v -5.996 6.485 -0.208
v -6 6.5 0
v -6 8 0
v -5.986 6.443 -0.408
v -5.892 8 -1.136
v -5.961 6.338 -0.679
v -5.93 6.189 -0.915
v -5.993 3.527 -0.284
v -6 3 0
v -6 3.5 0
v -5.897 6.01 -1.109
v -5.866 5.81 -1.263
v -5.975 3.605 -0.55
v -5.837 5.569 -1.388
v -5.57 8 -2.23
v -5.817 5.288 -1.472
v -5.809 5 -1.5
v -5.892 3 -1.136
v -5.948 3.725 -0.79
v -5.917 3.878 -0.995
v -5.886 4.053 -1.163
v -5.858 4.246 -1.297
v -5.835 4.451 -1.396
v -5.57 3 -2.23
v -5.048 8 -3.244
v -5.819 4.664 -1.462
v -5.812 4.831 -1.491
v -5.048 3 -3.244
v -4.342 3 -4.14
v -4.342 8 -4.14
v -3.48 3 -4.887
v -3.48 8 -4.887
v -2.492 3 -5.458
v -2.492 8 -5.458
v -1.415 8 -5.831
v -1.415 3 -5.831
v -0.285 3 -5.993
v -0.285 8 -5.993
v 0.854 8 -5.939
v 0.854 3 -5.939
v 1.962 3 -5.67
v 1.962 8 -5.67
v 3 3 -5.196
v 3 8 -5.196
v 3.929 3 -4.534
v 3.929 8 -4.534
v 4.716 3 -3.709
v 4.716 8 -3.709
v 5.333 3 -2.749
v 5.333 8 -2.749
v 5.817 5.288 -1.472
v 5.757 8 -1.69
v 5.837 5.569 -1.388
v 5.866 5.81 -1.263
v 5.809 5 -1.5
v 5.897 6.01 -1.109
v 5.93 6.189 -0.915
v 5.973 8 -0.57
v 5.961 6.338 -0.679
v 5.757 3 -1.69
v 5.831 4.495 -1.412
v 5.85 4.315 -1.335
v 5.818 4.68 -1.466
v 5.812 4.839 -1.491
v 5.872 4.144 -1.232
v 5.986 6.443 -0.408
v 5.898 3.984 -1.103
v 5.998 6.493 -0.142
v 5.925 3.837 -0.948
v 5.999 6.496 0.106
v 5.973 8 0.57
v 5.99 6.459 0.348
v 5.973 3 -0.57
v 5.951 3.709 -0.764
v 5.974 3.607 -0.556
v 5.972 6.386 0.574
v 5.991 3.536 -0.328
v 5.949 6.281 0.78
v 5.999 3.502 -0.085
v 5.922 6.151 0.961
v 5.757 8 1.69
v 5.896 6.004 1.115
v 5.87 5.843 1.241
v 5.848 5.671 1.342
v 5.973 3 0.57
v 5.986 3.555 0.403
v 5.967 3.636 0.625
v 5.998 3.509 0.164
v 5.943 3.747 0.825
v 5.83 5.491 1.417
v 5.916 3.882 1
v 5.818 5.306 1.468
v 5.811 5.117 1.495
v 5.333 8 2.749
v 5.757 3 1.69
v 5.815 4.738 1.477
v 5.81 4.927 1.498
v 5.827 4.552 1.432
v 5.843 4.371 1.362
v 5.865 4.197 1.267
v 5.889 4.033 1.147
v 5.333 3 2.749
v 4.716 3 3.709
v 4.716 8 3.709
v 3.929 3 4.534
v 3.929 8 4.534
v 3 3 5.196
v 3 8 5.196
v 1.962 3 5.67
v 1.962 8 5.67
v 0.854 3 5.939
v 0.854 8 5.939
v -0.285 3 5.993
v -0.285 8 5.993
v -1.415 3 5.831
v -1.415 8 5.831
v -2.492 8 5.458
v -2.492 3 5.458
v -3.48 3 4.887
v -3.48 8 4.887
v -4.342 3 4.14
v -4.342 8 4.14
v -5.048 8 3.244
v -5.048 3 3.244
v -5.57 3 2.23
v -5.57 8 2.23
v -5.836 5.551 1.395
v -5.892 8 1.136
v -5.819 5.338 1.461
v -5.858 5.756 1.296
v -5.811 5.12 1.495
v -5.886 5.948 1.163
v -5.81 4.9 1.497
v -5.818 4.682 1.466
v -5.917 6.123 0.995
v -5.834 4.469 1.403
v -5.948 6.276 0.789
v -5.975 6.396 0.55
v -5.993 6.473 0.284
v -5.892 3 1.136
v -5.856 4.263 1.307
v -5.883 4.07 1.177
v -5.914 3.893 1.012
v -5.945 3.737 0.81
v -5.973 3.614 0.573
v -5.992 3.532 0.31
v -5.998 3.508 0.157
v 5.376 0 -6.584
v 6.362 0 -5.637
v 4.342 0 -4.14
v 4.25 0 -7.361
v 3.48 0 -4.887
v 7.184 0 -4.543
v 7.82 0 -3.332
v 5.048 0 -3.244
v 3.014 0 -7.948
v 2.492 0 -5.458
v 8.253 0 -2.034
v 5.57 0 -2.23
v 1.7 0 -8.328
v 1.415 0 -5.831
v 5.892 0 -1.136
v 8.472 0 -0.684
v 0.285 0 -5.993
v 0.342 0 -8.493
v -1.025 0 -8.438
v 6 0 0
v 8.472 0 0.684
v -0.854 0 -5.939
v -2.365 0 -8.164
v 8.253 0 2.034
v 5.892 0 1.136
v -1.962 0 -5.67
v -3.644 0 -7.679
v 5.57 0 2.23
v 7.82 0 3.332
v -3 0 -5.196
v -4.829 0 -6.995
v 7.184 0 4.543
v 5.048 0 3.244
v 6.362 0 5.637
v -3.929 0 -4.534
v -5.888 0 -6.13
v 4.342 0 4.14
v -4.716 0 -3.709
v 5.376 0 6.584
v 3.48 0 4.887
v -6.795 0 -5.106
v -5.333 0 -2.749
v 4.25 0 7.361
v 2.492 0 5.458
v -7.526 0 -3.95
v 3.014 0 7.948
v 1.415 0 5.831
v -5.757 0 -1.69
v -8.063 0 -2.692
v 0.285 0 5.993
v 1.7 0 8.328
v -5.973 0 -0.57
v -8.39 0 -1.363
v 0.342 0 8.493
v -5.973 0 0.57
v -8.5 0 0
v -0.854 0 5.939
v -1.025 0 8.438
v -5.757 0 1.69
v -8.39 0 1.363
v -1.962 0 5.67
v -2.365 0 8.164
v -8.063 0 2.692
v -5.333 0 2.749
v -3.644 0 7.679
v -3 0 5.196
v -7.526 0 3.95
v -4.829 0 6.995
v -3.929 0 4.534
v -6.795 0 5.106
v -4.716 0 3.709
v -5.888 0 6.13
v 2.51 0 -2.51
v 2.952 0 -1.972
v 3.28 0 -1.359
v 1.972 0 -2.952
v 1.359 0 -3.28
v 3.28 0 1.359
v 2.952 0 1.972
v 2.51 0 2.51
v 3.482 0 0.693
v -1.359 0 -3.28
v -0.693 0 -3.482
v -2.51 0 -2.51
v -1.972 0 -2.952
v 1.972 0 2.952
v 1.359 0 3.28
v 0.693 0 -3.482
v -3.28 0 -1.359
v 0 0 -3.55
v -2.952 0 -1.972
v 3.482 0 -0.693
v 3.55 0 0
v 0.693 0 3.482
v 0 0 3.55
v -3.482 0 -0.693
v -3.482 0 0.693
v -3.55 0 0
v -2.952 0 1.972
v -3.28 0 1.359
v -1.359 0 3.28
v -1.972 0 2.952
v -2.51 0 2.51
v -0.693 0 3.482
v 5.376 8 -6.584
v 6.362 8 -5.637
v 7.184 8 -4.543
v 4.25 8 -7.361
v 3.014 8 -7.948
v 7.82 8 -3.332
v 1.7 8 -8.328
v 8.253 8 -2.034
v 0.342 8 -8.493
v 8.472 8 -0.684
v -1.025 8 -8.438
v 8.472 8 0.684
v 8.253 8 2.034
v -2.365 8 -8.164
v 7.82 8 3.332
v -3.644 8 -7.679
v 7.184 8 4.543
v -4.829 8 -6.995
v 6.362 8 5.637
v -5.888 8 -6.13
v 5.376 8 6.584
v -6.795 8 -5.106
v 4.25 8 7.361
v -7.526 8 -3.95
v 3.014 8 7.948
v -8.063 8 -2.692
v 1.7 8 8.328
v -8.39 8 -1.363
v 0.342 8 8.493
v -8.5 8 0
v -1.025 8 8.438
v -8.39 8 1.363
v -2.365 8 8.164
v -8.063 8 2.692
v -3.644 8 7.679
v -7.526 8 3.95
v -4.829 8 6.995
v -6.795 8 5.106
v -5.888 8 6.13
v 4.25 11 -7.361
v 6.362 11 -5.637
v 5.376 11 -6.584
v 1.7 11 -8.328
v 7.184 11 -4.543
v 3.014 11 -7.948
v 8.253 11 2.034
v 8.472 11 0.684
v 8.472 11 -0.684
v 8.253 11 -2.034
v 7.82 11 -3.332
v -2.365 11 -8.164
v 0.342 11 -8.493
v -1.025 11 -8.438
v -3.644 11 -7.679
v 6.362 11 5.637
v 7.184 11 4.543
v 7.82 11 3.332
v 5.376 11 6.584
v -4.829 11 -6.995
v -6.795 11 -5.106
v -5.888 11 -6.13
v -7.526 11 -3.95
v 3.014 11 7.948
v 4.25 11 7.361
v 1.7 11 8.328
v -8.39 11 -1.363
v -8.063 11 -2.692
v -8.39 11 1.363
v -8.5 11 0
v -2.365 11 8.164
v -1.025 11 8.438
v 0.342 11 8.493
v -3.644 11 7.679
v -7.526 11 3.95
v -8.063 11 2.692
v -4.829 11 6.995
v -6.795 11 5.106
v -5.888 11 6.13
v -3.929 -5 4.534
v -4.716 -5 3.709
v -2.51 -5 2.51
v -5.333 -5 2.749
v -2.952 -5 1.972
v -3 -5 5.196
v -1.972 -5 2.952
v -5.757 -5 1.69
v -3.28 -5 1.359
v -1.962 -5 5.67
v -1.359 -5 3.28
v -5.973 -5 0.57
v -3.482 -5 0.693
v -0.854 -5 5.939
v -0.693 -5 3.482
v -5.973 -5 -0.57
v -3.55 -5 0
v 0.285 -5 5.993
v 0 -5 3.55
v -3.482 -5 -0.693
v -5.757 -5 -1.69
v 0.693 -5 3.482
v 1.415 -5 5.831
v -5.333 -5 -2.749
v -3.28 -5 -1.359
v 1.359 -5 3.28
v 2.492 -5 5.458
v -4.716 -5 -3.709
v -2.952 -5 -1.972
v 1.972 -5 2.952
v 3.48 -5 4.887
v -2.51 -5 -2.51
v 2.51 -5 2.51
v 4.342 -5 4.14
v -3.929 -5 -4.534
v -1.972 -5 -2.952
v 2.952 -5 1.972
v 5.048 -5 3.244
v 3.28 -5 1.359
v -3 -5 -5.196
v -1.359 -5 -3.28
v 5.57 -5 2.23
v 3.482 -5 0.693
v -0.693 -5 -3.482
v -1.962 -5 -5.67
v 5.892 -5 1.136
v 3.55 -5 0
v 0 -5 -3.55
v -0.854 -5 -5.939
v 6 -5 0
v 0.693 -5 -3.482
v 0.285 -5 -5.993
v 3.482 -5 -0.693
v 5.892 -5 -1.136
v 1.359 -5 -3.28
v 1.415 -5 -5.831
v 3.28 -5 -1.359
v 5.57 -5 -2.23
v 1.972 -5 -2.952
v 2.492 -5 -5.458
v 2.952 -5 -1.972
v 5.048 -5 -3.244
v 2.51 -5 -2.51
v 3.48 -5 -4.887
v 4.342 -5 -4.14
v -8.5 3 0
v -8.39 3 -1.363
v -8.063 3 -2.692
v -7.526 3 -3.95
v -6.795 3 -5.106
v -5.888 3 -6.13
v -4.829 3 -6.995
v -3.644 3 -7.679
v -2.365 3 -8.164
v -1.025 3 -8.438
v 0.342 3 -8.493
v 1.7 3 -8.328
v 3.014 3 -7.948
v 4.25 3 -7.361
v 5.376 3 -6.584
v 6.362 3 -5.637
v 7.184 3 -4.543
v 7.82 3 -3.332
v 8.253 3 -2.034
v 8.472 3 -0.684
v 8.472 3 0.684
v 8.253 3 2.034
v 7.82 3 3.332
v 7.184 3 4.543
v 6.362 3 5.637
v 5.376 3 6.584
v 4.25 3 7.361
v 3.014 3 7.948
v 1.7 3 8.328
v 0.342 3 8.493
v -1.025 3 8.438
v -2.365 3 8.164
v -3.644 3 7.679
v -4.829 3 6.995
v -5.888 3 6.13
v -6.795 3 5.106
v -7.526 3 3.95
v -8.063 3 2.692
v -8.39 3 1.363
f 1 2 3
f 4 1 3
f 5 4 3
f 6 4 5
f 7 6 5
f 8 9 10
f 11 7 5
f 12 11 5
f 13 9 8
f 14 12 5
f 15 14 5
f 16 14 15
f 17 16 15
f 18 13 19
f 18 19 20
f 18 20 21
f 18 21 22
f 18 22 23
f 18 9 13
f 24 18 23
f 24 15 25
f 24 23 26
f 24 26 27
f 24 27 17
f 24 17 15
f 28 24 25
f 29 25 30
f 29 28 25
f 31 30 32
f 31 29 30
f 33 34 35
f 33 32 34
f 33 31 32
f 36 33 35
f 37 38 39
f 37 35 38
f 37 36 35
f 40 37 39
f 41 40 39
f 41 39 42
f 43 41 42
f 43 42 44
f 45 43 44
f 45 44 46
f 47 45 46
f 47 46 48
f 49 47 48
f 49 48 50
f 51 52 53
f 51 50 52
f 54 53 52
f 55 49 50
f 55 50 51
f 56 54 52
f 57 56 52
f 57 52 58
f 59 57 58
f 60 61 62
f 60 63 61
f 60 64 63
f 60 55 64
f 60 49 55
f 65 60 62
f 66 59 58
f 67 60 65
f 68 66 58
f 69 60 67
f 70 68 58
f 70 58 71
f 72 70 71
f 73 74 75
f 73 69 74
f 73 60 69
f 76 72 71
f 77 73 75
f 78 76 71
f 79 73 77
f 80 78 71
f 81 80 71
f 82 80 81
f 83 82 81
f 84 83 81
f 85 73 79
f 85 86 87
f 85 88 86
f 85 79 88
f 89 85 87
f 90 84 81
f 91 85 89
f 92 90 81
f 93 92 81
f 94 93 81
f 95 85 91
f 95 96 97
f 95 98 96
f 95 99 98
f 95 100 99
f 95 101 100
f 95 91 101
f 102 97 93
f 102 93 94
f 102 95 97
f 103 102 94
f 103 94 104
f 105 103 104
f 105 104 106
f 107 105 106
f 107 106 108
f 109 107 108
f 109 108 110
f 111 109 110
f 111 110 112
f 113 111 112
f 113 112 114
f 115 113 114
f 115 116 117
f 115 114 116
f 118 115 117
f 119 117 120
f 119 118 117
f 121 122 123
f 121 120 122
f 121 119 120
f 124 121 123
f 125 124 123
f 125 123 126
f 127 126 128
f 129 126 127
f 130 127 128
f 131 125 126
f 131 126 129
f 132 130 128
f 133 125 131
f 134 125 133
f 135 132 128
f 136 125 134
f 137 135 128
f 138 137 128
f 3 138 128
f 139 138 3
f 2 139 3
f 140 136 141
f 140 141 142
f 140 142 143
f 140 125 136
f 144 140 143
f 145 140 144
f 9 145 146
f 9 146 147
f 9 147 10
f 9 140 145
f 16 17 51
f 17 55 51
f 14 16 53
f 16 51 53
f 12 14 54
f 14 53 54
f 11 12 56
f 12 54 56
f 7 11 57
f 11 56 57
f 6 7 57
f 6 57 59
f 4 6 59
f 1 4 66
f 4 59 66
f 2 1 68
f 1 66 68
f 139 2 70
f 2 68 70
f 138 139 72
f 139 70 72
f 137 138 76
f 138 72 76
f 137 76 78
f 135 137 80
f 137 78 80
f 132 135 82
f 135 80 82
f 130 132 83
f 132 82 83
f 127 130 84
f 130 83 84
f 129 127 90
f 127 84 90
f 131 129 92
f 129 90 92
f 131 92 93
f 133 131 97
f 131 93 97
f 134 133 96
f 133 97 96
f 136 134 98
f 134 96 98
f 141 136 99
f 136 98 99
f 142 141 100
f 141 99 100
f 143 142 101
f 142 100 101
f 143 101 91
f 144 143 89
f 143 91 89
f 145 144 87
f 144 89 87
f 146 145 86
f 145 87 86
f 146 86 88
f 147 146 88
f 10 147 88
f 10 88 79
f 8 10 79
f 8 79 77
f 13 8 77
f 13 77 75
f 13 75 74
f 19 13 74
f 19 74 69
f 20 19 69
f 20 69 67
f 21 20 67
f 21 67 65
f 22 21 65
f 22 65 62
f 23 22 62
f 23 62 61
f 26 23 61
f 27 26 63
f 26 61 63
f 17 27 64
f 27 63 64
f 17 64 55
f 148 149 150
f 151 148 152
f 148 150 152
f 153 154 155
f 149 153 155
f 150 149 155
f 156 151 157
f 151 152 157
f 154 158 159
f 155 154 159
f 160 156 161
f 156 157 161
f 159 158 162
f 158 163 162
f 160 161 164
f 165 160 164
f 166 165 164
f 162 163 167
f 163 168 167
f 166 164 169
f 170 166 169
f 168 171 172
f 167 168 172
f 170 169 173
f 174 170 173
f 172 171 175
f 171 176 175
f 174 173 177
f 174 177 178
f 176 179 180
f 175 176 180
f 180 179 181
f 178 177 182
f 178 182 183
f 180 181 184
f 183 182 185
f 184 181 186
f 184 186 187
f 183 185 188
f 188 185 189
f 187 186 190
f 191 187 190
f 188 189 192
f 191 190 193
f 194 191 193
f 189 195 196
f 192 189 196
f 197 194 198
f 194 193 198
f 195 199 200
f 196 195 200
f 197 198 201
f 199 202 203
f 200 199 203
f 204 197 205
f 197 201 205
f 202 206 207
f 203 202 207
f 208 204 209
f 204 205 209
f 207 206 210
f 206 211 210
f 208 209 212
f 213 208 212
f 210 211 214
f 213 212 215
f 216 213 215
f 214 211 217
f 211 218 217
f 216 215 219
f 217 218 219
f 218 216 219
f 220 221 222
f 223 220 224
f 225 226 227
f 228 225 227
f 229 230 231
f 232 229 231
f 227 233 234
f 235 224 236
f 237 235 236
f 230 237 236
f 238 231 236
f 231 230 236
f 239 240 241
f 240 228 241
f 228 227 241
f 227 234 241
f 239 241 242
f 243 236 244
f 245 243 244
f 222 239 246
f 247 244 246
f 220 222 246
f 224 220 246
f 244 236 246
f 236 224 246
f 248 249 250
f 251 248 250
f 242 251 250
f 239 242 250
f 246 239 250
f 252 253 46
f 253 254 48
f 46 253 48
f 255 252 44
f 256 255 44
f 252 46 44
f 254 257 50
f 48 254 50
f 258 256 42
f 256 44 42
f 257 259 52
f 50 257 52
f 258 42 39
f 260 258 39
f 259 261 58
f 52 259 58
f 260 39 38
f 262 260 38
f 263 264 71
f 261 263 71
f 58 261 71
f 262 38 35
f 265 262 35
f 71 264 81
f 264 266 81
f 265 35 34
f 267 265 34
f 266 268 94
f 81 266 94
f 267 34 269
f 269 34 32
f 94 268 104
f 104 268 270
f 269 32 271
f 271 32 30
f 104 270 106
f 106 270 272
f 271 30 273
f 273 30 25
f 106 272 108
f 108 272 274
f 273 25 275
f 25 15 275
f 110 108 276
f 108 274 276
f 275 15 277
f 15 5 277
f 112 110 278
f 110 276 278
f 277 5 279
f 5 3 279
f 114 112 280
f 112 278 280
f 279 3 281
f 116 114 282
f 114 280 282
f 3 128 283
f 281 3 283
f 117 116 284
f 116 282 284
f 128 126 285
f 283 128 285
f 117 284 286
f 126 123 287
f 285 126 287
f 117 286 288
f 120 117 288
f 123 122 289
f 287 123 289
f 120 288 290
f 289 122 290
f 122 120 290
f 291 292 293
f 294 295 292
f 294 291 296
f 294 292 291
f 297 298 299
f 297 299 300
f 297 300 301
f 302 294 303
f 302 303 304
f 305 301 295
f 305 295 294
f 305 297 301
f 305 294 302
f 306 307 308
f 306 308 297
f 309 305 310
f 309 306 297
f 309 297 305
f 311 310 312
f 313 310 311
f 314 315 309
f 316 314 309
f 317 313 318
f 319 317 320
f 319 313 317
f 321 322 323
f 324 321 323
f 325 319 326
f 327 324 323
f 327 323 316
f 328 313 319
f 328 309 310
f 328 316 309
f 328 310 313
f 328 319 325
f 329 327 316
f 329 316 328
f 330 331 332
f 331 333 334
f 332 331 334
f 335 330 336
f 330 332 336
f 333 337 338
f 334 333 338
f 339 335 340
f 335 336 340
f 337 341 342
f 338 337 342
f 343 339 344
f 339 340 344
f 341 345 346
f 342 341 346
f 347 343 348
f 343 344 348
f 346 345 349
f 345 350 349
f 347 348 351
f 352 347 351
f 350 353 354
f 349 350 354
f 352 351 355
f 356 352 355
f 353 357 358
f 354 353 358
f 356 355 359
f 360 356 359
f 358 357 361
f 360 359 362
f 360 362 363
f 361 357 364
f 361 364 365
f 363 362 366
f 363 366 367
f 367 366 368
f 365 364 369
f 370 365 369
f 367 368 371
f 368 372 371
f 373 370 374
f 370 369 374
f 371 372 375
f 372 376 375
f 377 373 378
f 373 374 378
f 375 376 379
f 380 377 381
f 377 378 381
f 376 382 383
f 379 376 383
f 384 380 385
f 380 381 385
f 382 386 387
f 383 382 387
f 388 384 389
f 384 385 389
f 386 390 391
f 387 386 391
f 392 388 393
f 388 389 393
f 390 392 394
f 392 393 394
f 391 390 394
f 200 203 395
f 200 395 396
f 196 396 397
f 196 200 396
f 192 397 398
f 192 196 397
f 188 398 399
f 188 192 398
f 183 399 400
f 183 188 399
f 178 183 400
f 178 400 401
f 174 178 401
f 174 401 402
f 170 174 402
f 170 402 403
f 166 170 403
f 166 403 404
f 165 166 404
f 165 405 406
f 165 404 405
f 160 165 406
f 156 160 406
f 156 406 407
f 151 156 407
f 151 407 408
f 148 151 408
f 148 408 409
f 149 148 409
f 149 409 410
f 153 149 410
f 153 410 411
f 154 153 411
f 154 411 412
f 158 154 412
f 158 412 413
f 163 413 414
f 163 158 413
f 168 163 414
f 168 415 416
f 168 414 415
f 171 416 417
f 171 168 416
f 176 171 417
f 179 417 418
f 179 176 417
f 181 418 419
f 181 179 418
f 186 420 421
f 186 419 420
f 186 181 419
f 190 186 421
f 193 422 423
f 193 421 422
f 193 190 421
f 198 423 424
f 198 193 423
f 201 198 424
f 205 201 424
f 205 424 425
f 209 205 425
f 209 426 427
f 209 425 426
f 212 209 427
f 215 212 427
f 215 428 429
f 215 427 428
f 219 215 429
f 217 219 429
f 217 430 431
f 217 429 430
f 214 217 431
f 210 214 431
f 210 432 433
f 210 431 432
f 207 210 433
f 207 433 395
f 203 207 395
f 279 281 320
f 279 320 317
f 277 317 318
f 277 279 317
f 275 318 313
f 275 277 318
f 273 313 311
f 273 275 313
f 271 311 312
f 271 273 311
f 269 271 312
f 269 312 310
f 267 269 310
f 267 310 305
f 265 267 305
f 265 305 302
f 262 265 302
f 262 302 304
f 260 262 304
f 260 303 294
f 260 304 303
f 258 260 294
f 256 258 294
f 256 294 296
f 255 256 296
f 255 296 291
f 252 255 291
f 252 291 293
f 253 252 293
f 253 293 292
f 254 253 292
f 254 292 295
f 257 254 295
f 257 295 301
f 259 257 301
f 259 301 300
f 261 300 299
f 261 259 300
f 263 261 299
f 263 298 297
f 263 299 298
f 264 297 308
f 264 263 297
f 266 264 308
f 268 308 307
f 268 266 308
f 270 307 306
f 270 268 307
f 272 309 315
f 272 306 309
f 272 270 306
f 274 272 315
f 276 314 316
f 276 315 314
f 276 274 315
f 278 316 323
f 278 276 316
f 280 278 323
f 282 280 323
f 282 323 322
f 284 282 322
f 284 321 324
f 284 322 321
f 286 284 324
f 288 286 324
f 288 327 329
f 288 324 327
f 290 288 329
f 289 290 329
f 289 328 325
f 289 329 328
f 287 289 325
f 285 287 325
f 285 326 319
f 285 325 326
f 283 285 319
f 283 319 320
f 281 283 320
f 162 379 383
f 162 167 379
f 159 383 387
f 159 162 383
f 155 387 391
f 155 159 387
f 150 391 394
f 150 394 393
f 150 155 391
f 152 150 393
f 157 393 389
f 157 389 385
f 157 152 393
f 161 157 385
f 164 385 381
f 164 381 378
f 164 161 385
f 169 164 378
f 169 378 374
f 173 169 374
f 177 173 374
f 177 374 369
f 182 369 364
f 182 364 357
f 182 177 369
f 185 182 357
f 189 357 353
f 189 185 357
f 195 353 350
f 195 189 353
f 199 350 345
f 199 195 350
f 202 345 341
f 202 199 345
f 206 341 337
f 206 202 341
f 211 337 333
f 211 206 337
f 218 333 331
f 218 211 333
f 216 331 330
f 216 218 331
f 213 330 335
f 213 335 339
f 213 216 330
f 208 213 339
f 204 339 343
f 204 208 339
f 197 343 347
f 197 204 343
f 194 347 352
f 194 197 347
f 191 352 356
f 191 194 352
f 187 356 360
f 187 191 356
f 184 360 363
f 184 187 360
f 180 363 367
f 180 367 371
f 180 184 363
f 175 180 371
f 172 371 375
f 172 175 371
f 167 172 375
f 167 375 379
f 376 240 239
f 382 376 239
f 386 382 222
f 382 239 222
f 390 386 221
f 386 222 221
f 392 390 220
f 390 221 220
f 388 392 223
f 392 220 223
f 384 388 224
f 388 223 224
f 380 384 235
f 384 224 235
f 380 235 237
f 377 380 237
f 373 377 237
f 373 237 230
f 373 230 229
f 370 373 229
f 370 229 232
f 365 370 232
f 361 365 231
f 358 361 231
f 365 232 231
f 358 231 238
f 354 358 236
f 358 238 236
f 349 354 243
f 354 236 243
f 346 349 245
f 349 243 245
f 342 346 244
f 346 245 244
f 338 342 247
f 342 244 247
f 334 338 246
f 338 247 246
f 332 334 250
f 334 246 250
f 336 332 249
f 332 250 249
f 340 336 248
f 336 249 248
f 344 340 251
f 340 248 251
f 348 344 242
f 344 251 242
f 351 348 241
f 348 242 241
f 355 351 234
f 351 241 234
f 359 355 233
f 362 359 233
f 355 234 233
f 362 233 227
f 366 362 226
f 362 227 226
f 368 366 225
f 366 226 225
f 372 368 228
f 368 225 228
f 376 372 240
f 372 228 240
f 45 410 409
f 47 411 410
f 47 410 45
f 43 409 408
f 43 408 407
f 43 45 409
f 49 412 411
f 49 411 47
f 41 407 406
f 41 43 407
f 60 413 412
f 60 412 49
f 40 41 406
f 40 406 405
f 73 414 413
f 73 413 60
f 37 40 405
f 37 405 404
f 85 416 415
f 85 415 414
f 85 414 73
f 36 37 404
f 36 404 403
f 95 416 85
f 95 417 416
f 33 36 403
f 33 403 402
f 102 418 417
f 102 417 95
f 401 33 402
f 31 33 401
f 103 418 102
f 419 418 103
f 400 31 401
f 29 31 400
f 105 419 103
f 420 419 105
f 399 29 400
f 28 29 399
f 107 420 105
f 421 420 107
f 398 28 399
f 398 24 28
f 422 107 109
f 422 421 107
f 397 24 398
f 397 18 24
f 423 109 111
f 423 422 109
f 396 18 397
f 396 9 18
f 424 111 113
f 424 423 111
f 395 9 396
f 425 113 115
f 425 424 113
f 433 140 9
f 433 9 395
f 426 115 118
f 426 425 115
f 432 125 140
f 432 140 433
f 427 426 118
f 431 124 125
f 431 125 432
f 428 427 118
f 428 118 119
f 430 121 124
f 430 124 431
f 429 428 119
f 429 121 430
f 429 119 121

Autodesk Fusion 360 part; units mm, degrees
sketch "Sketch1" plane through (0, 0, 0) normal (0, 1, 0) x (1, 0, 0)
  circle A0 centre (0, 0) radius 3.55
  circle A1 centre (0, 0) radius 6
  dimension "d1" = 7.1
  dimension "d2" = 12
extrude "Extrude1" add sketch "Sketch1" against normal blind 5
sketch "Sketch2" plane through (0, 0, 0) normal (0, 1, 0) x (-1, 0, 0)
  circle A0 centre (0, 0) radius 3.55
  circle A1 centre (0, 0) radius 6
  circle A2 centre (0, 0) radius 8.5
  dimension "d5" = 17
extrude "Extrude2" add sketch "Sketch2" along normal blind 3 contours A0 | A1 | A2
sketch "Sketch3" plane through (0, 3, 0) normal (0, 1, 0) x (-1, 0, 0)
  circle A0 centre (0, 0) radius 8.5
  circle A1 centre (0, 0) radius 6
  dimension "d8" = 12
extrude "Extrude3" add sketch "Sketch3" along normal blind 5 contours A1
sketch "Sketch4" plane through (0, 8, 0) normal (0, 1, 0) x (-1, 0, 0)
  circle A0 centre (0, 0) radius 6
  circle A1 centre (0, 0) radius 8.5
extrude "Extrude4" add sketch "Sketch4" along normal blind 3 contours A0 | A1
sketch "Sketch5" plane through (0, 0, 0) normal (1, 0, 0) x (0, 0, -1)
  circle A0 centre (0, 5) radius 1.5
  dimension "d13" = 3
extrude "Extrude5" cut sketch "Sketch5" along normal blind 10 and the other way blind 12
